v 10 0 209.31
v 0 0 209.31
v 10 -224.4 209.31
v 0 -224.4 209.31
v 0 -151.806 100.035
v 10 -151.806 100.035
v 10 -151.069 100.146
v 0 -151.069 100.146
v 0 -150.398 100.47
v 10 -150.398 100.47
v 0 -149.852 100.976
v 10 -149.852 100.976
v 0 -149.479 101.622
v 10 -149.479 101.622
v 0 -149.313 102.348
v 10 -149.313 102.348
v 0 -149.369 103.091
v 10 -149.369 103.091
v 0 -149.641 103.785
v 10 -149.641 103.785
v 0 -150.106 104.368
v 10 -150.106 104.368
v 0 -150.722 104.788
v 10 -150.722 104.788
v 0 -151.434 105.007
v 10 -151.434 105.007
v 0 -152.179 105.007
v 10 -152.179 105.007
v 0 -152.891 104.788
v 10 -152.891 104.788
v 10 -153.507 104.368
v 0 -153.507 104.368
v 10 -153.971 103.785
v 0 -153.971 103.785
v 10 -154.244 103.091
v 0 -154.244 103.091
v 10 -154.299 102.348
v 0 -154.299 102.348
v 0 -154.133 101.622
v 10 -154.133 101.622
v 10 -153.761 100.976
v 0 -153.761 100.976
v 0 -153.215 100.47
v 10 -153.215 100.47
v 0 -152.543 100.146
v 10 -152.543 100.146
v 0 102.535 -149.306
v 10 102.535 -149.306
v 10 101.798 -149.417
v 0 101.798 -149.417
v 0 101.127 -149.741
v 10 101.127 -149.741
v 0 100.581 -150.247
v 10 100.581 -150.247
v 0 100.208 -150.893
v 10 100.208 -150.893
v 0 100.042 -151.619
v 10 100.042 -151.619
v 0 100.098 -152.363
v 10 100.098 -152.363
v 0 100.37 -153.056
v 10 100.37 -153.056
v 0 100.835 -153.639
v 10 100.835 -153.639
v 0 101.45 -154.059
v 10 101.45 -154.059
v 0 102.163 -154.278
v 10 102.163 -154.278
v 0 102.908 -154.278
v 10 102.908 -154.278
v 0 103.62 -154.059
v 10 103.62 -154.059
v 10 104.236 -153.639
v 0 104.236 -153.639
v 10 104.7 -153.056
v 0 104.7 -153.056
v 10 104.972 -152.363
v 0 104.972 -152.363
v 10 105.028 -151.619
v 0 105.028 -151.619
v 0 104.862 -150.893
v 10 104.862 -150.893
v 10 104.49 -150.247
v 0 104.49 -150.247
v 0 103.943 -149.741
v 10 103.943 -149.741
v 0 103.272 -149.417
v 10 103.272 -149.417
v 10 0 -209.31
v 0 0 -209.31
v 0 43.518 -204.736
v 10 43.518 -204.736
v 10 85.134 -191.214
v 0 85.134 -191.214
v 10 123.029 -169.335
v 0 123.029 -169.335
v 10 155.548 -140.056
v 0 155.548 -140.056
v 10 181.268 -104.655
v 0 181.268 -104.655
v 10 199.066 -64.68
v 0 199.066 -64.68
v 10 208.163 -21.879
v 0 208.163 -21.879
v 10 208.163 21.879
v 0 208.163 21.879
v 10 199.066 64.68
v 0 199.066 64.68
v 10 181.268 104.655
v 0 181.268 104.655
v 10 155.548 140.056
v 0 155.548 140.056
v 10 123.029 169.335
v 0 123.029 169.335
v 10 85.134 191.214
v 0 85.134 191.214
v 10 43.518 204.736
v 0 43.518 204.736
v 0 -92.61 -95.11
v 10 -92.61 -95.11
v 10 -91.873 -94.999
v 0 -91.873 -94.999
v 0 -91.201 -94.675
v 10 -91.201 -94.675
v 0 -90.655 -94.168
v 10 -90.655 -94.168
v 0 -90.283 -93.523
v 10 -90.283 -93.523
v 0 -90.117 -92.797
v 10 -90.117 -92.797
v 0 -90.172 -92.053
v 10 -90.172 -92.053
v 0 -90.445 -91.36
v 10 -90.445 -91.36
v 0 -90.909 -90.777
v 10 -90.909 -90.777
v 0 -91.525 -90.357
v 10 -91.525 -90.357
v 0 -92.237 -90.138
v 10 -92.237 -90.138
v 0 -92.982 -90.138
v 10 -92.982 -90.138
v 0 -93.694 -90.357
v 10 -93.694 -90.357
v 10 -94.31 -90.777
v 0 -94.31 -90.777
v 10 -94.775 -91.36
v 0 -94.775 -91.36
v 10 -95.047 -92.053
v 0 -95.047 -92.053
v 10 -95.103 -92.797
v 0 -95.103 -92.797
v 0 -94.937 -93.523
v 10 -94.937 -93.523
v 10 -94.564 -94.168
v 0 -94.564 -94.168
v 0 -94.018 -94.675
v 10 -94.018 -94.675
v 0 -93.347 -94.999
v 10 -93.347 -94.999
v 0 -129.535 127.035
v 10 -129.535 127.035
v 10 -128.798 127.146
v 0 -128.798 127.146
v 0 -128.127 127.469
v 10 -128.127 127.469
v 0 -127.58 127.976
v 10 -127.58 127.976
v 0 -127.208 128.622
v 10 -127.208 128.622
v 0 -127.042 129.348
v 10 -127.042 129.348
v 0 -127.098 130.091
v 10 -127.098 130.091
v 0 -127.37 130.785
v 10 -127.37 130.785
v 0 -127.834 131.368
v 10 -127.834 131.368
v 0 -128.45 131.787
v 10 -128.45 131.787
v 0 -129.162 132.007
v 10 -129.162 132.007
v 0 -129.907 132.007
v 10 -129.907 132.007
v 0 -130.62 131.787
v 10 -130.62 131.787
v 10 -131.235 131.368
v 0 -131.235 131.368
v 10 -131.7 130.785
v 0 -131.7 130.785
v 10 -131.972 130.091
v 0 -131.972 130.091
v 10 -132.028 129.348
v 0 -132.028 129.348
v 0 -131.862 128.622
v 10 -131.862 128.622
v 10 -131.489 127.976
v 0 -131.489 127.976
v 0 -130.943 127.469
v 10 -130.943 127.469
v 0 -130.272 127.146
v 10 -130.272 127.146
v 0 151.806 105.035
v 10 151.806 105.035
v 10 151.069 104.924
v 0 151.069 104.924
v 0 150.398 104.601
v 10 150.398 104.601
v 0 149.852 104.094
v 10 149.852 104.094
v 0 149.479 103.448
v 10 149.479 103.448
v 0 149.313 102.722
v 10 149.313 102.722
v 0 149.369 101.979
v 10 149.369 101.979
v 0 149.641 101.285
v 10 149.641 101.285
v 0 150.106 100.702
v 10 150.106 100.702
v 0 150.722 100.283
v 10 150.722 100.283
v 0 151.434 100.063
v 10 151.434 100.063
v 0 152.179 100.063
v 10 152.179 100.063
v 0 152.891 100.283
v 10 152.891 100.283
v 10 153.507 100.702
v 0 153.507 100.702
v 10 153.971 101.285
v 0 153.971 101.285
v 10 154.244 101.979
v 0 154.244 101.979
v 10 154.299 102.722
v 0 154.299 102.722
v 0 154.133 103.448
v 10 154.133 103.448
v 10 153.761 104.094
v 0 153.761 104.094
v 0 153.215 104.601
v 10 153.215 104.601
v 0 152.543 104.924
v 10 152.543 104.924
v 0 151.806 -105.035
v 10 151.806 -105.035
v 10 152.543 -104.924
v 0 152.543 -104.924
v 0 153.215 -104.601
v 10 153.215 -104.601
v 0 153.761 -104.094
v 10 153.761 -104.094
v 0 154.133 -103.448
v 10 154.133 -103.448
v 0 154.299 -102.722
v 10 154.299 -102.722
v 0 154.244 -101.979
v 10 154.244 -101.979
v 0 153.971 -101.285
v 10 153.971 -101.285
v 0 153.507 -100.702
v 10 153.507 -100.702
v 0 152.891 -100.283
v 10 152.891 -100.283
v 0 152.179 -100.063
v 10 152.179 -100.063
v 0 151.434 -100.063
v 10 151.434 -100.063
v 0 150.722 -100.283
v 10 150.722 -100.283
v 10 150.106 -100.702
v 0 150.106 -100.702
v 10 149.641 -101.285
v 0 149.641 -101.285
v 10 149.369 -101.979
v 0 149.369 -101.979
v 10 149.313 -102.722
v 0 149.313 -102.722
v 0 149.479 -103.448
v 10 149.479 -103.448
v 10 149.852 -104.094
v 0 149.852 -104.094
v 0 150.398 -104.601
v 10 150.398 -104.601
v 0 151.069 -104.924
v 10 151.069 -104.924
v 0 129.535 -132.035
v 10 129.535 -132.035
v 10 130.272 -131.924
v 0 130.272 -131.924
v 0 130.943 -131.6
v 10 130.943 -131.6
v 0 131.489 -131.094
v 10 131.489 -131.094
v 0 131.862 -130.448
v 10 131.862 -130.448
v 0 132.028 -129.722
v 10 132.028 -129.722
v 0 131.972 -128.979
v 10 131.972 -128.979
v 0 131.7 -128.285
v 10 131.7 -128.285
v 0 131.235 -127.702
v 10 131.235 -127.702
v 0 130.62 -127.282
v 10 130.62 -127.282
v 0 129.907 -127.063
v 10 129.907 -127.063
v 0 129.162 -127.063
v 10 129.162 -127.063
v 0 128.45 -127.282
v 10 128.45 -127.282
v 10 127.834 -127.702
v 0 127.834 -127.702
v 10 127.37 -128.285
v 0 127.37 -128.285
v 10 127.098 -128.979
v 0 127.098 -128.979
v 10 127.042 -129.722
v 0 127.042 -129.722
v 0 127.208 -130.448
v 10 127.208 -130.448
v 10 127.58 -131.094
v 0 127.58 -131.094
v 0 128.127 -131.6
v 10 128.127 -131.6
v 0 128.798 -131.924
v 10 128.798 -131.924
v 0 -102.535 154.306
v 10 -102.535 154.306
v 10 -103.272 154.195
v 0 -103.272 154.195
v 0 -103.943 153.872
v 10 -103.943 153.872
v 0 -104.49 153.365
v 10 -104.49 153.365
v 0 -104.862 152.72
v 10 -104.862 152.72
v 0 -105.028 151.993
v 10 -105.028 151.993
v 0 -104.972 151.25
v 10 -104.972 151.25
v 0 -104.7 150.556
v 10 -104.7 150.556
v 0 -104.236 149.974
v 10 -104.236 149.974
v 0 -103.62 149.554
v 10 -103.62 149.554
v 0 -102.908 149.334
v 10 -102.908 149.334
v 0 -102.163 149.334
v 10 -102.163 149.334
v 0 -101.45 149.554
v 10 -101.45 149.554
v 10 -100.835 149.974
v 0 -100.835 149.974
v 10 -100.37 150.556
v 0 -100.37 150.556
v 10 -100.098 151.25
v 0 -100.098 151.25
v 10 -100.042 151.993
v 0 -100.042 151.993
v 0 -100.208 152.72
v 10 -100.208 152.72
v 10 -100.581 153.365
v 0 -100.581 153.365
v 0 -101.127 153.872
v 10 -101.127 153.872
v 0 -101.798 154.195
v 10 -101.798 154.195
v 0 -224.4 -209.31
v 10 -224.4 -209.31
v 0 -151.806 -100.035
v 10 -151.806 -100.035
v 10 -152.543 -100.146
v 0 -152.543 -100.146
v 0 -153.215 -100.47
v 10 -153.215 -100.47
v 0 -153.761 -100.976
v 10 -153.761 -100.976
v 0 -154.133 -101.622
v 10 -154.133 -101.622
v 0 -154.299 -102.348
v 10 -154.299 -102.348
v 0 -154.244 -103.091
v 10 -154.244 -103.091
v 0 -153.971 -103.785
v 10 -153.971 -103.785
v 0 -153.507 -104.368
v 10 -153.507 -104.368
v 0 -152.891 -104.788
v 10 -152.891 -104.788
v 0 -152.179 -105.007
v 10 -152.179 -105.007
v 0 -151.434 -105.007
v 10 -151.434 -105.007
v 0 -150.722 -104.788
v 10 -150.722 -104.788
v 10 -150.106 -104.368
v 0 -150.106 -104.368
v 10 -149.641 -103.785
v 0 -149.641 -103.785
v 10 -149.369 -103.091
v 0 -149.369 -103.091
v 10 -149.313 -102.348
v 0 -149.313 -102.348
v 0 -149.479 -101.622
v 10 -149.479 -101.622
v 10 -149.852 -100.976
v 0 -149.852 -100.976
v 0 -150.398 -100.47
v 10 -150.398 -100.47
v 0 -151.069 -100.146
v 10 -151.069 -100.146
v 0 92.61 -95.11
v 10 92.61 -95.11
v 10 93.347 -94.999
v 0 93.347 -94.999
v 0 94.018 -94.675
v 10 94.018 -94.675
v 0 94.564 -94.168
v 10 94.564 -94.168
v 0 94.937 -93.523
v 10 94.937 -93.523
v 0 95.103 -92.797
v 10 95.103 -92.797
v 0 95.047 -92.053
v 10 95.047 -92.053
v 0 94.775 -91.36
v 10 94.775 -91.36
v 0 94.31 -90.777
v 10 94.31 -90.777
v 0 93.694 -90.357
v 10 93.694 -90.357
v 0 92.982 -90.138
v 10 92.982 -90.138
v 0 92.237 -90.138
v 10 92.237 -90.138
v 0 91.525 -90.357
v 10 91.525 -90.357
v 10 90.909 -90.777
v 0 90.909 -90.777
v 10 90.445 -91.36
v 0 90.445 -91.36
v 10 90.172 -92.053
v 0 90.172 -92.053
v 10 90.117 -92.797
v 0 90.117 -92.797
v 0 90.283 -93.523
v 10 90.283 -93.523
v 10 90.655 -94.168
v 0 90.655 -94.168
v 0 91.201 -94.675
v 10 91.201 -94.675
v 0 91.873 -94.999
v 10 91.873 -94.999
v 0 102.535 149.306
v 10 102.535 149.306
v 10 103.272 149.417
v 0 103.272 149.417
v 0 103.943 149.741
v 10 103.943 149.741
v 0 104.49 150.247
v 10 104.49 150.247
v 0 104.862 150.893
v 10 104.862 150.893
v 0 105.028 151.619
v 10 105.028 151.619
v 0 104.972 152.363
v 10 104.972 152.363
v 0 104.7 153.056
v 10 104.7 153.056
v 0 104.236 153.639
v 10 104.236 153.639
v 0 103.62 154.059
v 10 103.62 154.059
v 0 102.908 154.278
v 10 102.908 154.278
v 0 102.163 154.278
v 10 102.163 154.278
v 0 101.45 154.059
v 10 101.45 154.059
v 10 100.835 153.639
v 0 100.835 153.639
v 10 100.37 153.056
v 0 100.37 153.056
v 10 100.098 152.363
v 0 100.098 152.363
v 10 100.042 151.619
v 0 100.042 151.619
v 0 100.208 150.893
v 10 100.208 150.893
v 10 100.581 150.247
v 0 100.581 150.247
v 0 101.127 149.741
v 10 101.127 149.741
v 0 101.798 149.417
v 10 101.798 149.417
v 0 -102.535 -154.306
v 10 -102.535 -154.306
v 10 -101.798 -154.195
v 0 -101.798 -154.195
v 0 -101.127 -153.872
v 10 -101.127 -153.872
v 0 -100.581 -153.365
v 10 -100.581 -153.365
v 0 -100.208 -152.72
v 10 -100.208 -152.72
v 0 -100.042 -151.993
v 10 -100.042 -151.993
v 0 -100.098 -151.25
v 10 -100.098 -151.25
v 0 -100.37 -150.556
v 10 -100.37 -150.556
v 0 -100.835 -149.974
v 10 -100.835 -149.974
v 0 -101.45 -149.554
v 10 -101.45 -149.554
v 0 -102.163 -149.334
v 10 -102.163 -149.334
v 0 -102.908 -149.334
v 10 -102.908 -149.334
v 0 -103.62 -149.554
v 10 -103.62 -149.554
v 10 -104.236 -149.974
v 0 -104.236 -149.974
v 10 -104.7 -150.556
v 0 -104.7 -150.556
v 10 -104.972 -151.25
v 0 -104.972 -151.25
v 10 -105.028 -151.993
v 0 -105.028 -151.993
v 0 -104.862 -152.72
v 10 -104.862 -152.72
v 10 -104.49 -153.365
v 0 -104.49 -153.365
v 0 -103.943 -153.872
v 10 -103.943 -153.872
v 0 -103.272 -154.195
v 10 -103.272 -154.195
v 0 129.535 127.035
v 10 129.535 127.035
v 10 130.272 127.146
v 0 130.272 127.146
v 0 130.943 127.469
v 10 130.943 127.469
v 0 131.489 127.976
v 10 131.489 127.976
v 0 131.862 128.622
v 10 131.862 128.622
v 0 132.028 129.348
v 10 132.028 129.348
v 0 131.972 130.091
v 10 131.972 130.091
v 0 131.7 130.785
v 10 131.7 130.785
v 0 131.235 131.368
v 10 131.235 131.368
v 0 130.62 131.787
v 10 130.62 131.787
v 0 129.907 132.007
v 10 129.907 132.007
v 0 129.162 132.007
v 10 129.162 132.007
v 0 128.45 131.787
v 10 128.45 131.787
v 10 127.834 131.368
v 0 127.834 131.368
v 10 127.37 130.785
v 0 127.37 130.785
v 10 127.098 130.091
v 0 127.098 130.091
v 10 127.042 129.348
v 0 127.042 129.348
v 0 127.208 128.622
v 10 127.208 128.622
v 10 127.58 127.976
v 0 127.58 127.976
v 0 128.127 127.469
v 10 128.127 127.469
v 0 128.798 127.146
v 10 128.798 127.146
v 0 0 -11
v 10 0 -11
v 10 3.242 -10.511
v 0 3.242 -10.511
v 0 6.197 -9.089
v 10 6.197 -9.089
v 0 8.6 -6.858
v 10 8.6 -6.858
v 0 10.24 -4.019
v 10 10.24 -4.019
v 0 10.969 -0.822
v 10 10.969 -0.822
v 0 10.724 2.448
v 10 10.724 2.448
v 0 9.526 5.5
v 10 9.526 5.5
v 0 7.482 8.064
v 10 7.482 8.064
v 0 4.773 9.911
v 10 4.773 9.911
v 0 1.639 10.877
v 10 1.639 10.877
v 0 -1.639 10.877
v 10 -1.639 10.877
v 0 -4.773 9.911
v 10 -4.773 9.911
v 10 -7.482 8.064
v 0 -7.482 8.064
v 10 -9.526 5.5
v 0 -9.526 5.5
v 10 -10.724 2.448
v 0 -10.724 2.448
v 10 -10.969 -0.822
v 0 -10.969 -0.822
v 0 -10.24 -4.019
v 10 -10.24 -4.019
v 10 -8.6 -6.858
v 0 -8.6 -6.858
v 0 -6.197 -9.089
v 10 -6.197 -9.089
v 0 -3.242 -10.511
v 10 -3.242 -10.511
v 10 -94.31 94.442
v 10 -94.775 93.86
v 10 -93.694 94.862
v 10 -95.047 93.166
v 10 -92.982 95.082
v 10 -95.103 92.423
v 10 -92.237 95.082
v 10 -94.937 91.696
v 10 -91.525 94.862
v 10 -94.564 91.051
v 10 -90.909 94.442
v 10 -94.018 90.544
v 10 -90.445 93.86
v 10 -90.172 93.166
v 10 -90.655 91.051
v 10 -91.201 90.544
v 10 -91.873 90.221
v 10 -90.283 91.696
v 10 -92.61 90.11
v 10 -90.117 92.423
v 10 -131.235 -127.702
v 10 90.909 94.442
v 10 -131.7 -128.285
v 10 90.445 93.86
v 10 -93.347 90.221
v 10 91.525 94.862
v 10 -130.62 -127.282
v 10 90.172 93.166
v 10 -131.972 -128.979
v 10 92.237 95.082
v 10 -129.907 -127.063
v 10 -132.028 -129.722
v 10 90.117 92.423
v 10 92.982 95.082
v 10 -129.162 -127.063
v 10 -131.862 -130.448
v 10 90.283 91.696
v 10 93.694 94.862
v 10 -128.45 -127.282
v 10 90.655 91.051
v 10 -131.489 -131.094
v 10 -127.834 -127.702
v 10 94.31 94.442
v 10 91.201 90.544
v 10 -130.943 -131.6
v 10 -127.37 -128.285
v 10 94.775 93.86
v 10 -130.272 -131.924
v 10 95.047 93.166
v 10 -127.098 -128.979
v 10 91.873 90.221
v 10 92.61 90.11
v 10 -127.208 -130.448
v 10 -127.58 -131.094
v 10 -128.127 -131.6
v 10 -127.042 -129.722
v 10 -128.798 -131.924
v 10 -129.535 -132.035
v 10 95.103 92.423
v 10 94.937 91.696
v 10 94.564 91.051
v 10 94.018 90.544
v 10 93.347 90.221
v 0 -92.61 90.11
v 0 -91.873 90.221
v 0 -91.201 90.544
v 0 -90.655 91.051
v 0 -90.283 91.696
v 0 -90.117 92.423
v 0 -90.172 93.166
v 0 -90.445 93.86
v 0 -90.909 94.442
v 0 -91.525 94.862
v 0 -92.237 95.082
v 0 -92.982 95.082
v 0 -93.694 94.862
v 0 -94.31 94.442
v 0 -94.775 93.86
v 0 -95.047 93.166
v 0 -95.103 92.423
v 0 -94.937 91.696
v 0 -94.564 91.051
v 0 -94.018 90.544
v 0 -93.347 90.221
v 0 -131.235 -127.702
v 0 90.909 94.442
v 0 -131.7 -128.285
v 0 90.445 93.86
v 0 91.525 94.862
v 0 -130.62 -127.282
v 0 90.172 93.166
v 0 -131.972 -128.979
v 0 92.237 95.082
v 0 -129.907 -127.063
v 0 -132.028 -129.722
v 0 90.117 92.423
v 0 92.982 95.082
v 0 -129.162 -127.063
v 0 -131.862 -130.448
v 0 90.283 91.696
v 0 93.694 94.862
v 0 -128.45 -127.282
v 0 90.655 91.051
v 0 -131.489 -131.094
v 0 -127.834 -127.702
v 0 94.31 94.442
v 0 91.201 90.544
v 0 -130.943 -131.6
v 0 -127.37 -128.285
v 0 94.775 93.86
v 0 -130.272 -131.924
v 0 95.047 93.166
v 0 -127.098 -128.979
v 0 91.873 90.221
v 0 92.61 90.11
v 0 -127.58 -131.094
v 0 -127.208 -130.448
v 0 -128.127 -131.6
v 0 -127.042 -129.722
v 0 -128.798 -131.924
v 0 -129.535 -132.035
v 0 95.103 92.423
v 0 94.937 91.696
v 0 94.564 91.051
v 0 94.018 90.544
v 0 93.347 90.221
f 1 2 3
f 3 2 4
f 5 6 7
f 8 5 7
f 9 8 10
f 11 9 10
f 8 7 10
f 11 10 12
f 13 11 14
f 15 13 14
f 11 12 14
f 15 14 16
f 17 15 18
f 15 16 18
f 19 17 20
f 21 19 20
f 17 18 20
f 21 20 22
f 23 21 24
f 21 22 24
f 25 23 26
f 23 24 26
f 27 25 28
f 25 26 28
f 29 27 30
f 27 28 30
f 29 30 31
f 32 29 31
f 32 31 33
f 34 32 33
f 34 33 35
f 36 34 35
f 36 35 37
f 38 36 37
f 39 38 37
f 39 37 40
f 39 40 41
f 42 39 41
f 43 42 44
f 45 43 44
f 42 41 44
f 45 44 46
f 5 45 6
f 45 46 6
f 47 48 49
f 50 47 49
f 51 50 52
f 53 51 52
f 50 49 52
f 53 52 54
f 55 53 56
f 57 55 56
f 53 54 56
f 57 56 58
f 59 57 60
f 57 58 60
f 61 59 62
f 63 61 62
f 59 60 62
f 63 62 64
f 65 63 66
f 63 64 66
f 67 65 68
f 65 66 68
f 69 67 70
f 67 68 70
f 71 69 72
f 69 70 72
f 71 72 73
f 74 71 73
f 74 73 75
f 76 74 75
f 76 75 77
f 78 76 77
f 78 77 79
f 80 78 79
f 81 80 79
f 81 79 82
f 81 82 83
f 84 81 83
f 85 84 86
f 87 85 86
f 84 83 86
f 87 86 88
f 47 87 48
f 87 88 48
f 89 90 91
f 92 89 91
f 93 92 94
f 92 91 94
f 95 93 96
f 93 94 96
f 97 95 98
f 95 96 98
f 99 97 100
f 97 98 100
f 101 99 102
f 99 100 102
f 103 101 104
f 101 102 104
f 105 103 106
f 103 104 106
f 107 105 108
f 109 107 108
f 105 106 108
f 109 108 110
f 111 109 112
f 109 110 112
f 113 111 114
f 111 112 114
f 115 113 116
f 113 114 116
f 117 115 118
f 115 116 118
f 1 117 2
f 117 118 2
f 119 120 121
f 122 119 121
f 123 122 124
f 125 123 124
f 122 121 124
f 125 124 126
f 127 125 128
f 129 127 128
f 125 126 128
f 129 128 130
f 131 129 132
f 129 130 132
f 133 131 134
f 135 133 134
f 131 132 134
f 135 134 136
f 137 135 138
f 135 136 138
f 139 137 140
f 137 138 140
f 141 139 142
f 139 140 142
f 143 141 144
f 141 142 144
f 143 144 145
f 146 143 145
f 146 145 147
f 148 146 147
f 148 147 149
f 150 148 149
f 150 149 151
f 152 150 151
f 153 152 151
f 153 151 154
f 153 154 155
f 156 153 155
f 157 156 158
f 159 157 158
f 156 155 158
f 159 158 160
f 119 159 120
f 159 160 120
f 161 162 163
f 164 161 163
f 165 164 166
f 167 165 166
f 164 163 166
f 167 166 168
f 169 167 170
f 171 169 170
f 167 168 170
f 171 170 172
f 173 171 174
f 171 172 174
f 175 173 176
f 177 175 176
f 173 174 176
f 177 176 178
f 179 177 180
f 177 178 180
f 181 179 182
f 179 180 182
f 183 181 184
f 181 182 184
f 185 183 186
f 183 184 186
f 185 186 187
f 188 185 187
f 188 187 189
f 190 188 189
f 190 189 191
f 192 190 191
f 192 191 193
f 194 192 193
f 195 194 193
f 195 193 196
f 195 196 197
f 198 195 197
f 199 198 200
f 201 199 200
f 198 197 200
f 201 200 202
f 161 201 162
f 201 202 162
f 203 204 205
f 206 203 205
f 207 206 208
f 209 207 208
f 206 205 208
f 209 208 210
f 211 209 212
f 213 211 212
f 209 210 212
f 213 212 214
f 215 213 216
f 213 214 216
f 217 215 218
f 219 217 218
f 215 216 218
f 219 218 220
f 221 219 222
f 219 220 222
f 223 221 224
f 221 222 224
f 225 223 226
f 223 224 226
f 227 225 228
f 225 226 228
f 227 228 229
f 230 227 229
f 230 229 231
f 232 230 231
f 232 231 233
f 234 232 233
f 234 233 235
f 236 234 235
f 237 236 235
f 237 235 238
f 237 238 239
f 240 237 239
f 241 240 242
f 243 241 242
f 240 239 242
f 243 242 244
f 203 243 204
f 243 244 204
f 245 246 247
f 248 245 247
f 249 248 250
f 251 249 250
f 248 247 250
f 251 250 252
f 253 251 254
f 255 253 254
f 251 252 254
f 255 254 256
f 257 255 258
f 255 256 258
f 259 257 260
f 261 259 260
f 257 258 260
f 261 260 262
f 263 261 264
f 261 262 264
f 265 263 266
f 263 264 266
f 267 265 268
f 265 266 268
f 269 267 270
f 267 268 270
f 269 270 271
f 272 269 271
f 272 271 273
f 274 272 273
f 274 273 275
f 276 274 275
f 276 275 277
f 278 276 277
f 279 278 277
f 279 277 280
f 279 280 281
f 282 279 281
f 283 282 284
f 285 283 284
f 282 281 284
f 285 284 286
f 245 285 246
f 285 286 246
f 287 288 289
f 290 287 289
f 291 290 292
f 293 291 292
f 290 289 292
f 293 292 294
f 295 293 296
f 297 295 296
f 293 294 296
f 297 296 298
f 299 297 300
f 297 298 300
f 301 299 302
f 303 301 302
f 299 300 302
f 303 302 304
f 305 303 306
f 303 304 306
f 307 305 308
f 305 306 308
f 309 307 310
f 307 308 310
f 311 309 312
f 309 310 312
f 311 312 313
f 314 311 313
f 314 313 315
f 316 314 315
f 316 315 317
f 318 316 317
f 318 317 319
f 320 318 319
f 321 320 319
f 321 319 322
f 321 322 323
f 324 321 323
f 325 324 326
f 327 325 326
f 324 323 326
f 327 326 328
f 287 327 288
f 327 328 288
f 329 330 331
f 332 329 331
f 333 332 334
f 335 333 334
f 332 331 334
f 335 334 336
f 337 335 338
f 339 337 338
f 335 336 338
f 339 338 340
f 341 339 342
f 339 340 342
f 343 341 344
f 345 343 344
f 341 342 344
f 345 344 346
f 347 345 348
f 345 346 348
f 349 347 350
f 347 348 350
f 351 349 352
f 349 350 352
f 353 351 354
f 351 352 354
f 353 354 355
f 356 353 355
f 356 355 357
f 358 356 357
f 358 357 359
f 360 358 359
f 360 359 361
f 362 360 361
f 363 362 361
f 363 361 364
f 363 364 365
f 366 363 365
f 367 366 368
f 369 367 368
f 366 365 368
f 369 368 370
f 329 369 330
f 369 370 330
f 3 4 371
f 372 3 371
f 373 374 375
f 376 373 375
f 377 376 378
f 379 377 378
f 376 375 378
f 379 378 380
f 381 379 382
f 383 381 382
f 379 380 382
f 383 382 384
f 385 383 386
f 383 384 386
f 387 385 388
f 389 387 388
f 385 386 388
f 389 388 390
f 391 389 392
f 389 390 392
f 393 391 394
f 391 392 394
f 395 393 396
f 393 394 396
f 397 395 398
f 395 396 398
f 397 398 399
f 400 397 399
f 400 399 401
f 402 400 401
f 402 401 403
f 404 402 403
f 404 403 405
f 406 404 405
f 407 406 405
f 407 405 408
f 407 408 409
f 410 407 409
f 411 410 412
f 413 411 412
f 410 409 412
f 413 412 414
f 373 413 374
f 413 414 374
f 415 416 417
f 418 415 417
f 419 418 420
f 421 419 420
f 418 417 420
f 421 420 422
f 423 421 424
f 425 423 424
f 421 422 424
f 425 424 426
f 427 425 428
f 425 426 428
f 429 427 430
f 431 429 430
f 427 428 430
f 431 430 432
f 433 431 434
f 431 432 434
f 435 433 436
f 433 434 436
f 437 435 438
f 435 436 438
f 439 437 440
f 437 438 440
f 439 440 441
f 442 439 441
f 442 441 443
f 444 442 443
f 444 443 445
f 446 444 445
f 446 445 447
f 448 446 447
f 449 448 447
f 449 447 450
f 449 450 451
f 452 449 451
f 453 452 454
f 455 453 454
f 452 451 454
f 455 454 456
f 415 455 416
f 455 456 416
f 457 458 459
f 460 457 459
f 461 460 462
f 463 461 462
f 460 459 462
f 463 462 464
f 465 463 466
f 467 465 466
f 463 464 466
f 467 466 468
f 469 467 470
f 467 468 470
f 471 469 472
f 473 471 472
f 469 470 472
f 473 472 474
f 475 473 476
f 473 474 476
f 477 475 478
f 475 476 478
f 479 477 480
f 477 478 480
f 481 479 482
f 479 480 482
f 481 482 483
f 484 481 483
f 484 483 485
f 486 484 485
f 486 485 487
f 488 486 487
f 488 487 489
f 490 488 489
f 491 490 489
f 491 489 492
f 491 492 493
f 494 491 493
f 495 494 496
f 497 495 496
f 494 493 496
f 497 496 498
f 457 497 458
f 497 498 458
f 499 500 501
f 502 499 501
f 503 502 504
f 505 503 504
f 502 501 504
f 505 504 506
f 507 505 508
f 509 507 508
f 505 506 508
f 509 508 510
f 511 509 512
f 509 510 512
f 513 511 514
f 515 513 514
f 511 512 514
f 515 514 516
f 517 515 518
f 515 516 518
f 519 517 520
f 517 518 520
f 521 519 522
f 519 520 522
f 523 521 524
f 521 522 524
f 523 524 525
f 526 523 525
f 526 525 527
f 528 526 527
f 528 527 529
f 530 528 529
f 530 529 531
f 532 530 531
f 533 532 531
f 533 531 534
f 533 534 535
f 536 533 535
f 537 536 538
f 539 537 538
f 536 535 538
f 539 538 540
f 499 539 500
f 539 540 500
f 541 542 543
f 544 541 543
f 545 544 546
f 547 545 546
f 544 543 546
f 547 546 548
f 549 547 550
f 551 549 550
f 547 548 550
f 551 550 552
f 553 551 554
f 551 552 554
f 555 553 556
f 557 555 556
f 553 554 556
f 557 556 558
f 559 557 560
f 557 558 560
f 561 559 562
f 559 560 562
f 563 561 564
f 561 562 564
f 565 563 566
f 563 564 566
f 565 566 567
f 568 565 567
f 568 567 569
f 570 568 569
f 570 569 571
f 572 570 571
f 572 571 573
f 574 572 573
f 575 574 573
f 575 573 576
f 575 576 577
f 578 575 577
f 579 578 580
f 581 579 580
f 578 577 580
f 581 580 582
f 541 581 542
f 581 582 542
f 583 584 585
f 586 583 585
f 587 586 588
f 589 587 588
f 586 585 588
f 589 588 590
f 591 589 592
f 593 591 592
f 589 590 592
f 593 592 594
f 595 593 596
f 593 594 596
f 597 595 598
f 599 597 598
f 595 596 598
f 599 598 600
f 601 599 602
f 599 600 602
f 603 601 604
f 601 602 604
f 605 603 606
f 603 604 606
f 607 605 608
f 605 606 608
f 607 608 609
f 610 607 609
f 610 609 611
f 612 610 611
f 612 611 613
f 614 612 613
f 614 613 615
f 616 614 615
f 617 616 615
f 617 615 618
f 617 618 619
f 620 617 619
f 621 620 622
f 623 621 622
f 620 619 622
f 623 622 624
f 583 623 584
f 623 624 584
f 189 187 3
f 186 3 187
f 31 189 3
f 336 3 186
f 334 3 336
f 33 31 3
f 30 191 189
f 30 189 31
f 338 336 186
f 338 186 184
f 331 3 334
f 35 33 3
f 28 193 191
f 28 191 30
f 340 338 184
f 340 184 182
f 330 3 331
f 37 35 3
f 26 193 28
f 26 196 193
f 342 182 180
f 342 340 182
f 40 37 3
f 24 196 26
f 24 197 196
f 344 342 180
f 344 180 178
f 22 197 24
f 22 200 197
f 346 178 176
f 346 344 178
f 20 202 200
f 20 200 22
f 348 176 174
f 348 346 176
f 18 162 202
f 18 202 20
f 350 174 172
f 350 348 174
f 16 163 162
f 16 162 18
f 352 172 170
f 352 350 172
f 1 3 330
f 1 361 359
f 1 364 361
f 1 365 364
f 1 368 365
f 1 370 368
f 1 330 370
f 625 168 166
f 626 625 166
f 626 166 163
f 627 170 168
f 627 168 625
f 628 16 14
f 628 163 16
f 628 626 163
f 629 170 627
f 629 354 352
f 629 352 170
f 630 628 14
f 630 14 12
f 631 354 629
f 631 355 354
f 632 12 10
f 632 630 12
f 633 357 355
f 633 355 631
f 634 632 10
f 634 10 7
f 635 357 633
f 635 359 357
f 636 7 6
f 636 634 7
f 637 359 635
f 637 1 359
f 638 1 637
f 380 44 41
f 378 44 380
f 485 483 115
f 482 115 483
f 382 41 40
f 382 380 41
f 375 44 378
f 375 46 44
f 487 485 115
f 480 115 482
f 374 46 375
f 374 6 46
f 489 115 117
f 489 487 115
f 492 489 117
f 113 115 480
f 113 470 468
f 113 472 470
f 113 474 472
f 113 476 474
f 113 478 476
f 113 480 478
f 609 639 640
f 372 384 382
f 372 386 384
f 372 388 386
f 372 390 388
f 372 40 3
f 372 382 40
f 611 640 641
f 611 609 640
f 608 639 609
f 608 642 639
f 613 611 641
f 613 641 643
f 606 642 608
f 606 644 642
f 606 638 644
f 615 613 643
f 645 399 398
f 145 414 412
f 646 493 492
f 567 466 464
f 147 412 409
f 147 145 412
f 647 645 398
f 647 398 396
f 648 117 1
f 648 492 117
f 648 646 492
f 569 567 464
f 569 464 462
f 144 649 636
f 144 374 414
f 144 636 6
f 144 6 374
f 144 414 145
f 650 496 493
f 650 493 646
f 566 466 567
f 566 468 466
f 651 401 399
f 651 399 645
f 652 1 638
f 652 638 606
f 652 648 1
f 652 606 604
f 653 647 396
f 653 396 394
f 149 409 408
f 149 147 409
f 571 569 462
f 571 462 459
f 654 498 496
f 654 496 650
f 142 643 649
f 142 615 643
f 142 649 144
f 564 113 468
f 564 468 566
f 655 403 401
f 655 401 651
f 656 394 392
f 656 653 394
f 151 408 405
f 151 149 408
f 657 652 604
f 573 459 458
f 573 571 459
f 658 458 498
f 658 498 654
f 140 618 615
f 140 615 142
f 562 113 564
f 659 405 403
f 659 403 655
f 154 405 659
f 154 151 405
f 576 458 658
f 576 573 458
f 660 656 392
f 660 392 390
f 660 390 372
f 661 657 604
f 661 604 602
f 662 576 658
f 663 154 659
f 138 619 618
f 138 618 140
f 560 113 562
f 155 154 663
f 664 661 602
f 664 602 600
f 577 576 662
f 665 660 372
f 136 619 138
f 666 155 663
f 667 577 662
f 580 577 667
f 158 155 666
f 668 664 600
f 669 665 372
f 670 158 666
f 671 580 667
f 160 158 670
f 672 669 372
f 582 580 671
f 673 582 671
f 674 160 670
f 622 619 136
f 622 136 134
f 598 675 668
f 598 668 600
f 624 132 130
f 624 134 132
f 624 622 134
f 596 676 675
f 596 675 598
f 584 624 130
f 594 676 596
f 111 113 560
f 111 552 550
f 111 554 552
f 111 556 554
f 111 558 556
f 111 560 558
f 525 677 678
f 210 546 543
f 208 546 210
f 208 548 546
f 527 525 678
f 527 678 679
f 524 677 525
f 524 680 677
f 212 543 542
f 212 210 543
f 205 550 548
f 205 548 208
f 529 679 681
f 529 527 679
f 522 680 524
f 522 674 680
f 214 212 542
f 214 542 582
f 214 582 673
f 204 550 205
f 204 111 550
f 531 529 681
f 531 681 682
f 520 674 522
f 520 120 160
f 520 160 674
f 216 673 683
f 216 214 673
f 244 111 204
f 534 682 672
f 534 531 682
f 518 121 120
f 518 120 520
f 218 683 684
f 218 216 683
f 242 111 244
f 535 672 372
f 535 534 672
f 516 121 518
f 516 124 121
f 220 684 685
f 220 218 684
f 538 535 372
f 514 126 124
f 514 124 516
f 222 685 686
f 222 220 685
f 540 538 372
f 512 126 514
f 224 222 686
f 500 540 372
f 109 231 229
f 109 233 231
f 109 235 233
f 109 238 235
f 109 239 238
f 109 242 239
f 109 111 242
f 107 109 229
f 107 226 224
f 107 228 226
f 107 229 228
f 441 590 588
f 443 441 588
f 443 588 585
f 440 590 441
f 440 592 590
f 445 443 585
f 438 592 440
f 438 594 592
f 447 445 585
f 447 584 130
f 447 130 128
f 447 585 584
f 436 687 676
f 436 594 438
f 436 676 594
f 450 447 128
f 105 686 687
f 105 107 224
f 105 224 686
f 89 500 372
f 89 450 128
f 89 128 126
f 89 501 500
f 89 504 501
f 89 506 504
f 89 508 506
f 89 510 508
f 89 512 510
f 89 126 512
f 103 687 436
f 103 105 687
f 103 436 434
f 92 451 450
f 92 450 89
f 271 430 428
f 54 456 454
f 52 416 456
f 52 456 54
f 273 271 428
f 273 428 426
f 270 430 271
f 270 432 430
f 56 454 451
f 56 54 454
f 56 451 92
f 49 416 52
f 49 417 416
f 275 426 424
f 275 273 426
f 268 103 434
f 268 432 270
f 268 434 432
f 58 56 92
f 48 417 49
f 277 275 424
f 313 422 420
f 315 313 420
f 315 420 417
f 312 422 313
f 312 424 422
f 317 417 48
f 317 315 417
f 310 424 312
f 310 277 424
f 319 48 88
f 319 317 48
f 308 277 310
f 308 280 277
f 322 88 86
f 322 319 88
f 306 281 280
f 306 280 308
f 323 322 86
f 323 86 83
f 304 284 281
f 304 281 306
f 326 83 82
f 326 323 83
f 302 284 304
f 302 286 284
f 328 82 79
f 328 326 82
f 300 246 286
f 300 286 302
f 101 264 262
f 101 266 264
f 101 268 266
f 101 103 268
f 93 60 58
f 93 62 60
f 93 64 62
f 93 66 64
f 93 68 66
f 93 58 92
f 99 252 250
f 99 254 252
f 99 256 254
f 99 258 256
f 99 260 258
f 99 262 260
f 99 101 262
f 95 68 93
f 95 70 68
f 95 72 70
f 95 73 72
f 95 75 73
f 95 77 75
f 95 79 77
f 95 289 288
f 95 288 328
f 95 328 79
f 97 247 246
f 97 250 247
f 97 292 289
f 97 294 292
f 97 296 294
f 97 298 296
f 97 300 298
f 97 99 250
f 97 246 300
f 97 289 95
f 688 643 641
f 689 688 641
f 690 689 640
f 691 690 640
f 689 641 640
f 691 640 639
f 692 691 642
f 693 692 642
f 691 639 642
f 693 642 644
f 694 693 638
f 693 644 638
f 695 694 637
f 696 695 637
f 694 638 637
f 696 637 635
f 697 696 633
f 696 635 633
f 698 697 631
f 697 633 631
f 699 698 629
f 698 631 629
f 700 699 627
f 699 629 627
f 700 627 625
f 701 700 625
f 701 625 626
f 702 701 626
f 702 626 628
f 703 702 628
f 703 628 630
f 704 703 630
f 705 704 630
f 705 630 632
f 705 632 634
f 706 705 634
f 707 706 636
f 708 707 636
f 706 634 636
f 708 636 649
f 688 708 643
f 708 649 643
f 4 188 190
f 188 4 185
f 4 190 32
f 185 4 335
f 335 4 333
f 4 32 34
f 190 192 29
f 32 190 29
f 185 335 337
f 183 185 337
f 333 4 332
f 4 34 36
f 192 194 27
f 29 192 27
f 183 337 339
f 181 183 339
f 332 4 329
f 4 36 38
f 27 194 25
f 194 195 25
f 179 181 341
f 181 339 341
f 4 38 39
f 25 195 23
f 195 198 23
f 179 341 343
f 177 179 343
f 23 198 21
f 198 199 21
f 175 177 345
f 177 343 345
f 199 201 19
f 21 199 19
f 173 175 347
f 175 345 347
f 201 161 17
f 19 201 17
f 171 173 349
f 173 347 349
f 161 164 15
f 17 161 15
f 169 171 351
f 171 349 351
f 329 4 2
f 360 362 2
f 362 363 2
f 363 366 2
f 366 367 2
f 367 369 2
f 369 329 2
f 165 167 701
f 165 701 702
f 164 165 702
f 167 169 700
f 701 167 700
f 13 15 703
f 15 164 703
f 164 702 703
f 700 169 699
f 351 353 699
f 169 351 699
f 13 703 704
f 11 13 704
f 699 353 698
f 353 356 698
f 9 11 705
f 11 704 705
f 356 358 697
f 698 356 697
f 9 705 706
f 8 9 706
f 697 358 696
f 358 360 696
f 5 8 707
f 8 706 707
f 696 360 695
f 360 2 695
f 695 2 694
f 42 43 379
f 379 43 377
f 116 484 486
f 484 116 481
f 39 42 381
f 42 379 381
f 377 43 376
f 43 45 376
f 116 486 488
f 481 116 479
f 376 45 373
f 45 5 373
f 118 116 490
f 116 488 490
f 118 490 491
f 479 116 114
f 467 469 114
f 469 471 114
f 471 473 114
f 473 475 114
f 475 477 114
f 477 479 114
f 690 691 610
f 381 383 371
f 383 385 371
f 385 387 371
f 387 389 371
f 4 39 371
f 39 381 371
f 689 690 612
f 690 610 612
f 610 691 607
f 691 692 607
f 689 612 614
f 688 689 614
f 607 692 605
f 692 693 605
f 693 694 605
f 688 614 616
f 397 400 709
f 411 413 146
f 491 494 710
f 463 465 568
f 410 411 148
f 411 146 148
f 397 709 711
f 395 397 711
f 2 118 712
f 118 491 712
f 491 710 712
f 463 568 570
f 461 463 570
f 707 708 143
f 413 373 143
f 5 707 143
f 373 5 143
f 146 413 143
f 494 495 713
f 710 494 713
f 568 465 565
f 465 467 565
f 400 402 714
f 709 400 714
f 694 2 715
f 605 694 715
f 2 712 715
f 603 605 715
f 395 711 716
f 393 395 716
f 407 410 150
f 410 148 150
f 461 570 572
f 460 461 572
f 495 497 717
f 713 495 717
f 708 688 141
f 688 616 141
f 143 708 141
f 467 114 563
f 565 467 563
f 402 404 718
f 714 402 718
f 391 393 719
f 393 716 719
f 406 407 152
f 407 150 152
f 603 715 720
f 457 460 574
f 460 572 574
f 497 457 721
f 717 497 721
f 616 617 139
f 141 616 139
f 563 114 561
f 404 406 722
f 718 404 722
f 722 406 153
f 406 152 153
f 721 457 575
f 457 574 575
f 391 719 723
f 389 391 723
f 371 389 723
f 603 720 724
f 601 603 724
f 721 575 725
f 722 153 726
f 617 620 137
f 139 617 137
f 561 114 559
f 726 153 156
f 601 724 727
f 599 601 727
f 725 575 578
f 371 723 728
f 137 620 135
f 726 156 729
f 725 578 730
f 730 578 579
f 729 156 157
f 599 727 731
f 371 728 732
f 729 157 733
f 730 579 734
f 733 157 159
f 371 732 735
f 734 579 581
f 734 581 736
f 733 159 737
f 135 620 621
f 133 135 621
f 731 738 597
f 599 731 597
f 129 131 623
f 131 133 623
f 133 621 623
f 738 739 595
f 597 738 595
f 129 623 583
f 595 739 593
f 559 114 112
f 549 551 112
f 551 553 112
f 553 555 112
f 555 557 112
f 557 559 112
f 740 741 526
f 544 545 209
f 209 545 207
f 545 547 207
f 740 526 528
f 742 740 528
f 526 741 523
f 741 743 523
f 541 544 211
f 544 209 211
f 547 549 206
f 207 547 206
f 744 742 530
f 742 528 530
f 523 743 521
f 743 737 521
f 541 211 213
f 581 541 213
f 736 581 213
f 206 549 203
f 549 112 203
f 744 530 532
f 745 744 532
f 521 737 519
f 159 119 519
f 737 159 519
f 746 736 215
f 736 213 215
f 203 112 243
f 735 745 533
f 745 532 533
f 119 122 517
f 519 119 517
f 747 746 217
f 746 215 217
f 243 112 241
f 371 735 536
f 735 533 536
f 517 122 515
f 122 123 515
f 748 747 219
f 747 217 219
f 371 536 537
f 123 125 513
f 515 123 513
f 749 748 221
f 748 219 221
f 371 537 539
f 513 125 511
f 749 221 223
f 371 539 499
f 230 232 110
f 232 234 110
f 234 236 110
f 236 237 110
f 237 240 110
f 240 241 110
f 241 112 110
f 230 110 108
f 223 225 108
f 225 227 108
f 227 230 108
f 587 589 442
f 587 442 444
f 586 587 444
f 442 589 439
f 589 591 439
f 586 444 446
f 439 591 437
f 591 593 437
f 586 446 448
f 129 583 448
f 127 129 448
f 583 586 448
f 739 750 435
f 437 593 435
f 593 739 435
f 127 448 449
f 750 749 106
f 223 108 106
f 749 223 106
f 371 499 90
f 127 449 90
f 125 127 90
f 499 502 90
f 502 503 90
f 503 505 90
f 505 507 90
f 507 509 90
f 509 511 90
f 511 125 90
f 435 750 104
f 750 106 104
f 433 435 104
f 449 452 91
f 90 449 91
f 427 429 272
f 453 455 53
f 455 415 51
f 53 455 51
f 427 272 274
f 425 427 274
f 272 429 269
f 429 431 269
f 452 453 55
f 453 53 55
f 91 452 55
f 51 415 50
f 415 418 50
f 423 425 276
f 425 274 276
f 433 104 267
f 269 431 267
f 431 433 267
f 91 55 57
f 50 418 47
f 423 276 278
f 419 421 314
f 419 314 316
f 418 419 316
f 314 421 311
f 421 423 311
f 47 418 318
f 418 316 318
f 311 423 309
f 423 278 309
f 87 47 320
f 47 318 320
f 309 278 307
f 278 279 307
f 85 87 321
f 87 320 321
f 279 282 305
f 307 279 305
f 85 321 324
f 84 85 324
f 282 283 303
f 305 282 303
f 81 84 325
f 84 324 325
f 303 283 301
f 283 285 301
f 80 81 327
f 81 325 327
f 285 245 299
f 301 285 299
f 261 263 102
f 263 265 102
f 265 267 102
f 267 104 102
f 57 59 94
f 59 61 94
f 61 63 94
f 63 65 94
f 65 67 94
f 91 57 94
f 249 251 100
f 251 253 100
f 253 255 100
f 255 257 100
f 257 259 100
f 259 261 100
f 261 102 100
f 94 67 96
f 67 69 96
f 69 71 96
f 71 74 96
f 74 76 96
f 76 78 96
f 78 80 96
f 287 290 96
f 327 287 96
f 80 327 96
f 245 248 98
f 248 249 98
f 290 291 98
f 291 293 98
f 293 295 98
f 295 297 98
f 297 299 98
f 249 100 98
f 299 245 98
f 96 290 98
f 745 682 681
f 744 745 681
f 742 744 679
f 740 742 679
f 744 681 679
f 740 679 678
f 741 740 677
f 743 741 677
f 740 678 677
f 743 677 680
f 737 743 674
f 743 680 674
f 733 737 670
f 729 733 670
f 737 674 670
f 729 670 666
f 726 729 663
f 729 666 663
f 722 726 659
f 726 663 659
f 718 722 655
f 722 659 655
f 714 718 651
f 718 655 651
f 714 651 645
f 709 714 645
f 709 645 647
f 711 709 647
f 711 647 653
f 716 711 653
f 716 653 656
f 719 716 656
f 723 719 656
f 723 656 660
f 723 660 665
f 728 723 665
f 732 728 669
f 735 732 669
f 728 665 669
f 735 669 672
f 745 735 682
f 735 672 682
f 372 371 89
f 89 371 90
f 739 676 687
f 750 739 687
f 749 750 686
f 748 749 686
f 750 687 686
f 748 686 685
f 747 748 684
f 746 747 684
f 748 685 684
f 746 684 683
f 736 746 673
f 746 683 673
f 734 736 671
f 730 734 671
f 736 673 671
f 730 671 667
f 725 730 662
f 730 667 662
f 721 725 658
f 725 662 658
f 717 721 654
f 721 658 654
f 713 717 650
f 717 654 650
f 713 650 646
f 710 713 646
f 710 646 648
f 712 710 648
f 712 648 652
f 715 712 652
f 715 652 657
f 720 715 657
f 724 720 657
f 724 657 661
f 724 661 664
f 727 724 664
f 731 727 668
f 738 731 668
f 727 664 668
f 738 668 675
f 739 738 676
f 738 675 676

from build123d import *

# Parameters (mm, degrees)
BOSS_EXTRUDE1_DEPTH = 10
SKETCH2_R           = 2.5
CUT_EXTRUDE1_DEPTH  = 10
SKETCH3_R           = 11
CUT_EXTRUDE2_DEPTH  = 10
SKETCH4_R           = 2.5
CUT_EXTRUDE3_DEPTH  = 10


with BuildPart() as part:
    # Sketch1 → Boss-Extrude1 (new body)
    with BuildSketch(Plane(origin=(0, 0, 0), x_dir=(0, 0, -1), z_dir=(1, 0, 0))):
        with BuildLine():
            ThreePointArc((-209.31, 0), (0, -209.31), (209.31, 0))
            Line((209.31, 0), (-209.31, 0))
        make_face()
        with BuildLine():
            Line((-209.31, 0), (209.31, 0))
            ThreePointArc((209.31, 0), (0, 209.31), (-209.31, 0))
        make_face()
        with BuildLine():
            Line((-209.31, -224.4), (209.31, -224.4))
            Line((209.31, -224.4), (209.31, 0))
            ThreePointArc((209.31, 0), (0, -209.31), (-209.31, 0))
            Line((-209.31, 0), (-209.31, -224.4))
        make_face()
    extrude(amount=BOSS_EXTRUDE1_DEPTH)

    # Sketch2 → Cut-Extrude1 (cut)
    with BuildSketch(Plane(origin=(10, 0, 0), x_dir=(0, 0, -1), z_dir=(1, 0, 0))):
        with Locations((129.534891246, 129.534891246)):
            Circle(SKETCH2_R)
        with Locations((92.609775132, 92.609775132)):
            Circle(SKETCH2_R)
        with Locations((92.609775132, -92.609775132)):
            Circle(SKETCH2_R)
        with Locations((129.534891246, -129.534891246)):
            Circle(SKETCH2_R)
        with Locations((-92.609775132, -92.609775132)):
            Circle(SKETCH2_R)
        with Locations((-129.534891246, -129.534891246)):
            Circle(SKETCH2_R)
        with Locations((-92.609775132, 92.609775132)):
            Circle(SKETCH2_R)
        with Locations((-129.534891246, 129.534891246)):
            Circle(SKETCH2_R)
    extrude(amount=-CUT_EXTRUDE1_DEPTH, mode=Mode.SUBTRACT)

    # Sketch3 → Cut-Extrude2 (cut)
    with BuildSketch(Plane(origin=(10, 0, 0), x_dir=(0, 0, -1), z_dir=(1, 0, 0))):
        Circle(SKETCH3_R)
    extrude(amount=-CUT_EXTRUDE2_DEPTH, mode=Mode.SUBTRACT)

    # Sketch4 → Cut-Extrude3 (cut)
    with BuildSketch(Plane(origin=(10, 0, 0), x_dir=(0, 0, -1), z_dir=(1, 0, 0))):
        with Locations((-151.806215462, 102.53511129)):
            Circle(SKETCH4_R)
        with Locations(Location((-102.53511129, 151.806215462, 0), (0, 0, 180))):
            Circle(SKETCH4_R)
        with Locations((102.53511129, 151.806215462)):
            Circle(SKETCH4_R)
        with Locations(Location((151.806215462, 102.53511129, 0), (0, 0, 180))):
            Circle(SKETCH4_R)
        with Locations((151.806215462, -102.53511129)):
            Circle(SKETCH4_R)
        with Locations(Location((102.53511129, -151.806215462, 0), (0, 0, 180))):
            Circle(SKETCH4_R)
        with Locations((-102.53511129, -151.806215462)):
            Circle(SKETCH4_R)
        with Locations(Location((-151.806215462, -102.53511129, 0), (0, 0, 180))):
            Circle(SKETCH4_R)
    extrude(amount=-CUT_EXTRUDE3_DEPTH, mode=Mode.SUBTRACT)


solid = part.part
